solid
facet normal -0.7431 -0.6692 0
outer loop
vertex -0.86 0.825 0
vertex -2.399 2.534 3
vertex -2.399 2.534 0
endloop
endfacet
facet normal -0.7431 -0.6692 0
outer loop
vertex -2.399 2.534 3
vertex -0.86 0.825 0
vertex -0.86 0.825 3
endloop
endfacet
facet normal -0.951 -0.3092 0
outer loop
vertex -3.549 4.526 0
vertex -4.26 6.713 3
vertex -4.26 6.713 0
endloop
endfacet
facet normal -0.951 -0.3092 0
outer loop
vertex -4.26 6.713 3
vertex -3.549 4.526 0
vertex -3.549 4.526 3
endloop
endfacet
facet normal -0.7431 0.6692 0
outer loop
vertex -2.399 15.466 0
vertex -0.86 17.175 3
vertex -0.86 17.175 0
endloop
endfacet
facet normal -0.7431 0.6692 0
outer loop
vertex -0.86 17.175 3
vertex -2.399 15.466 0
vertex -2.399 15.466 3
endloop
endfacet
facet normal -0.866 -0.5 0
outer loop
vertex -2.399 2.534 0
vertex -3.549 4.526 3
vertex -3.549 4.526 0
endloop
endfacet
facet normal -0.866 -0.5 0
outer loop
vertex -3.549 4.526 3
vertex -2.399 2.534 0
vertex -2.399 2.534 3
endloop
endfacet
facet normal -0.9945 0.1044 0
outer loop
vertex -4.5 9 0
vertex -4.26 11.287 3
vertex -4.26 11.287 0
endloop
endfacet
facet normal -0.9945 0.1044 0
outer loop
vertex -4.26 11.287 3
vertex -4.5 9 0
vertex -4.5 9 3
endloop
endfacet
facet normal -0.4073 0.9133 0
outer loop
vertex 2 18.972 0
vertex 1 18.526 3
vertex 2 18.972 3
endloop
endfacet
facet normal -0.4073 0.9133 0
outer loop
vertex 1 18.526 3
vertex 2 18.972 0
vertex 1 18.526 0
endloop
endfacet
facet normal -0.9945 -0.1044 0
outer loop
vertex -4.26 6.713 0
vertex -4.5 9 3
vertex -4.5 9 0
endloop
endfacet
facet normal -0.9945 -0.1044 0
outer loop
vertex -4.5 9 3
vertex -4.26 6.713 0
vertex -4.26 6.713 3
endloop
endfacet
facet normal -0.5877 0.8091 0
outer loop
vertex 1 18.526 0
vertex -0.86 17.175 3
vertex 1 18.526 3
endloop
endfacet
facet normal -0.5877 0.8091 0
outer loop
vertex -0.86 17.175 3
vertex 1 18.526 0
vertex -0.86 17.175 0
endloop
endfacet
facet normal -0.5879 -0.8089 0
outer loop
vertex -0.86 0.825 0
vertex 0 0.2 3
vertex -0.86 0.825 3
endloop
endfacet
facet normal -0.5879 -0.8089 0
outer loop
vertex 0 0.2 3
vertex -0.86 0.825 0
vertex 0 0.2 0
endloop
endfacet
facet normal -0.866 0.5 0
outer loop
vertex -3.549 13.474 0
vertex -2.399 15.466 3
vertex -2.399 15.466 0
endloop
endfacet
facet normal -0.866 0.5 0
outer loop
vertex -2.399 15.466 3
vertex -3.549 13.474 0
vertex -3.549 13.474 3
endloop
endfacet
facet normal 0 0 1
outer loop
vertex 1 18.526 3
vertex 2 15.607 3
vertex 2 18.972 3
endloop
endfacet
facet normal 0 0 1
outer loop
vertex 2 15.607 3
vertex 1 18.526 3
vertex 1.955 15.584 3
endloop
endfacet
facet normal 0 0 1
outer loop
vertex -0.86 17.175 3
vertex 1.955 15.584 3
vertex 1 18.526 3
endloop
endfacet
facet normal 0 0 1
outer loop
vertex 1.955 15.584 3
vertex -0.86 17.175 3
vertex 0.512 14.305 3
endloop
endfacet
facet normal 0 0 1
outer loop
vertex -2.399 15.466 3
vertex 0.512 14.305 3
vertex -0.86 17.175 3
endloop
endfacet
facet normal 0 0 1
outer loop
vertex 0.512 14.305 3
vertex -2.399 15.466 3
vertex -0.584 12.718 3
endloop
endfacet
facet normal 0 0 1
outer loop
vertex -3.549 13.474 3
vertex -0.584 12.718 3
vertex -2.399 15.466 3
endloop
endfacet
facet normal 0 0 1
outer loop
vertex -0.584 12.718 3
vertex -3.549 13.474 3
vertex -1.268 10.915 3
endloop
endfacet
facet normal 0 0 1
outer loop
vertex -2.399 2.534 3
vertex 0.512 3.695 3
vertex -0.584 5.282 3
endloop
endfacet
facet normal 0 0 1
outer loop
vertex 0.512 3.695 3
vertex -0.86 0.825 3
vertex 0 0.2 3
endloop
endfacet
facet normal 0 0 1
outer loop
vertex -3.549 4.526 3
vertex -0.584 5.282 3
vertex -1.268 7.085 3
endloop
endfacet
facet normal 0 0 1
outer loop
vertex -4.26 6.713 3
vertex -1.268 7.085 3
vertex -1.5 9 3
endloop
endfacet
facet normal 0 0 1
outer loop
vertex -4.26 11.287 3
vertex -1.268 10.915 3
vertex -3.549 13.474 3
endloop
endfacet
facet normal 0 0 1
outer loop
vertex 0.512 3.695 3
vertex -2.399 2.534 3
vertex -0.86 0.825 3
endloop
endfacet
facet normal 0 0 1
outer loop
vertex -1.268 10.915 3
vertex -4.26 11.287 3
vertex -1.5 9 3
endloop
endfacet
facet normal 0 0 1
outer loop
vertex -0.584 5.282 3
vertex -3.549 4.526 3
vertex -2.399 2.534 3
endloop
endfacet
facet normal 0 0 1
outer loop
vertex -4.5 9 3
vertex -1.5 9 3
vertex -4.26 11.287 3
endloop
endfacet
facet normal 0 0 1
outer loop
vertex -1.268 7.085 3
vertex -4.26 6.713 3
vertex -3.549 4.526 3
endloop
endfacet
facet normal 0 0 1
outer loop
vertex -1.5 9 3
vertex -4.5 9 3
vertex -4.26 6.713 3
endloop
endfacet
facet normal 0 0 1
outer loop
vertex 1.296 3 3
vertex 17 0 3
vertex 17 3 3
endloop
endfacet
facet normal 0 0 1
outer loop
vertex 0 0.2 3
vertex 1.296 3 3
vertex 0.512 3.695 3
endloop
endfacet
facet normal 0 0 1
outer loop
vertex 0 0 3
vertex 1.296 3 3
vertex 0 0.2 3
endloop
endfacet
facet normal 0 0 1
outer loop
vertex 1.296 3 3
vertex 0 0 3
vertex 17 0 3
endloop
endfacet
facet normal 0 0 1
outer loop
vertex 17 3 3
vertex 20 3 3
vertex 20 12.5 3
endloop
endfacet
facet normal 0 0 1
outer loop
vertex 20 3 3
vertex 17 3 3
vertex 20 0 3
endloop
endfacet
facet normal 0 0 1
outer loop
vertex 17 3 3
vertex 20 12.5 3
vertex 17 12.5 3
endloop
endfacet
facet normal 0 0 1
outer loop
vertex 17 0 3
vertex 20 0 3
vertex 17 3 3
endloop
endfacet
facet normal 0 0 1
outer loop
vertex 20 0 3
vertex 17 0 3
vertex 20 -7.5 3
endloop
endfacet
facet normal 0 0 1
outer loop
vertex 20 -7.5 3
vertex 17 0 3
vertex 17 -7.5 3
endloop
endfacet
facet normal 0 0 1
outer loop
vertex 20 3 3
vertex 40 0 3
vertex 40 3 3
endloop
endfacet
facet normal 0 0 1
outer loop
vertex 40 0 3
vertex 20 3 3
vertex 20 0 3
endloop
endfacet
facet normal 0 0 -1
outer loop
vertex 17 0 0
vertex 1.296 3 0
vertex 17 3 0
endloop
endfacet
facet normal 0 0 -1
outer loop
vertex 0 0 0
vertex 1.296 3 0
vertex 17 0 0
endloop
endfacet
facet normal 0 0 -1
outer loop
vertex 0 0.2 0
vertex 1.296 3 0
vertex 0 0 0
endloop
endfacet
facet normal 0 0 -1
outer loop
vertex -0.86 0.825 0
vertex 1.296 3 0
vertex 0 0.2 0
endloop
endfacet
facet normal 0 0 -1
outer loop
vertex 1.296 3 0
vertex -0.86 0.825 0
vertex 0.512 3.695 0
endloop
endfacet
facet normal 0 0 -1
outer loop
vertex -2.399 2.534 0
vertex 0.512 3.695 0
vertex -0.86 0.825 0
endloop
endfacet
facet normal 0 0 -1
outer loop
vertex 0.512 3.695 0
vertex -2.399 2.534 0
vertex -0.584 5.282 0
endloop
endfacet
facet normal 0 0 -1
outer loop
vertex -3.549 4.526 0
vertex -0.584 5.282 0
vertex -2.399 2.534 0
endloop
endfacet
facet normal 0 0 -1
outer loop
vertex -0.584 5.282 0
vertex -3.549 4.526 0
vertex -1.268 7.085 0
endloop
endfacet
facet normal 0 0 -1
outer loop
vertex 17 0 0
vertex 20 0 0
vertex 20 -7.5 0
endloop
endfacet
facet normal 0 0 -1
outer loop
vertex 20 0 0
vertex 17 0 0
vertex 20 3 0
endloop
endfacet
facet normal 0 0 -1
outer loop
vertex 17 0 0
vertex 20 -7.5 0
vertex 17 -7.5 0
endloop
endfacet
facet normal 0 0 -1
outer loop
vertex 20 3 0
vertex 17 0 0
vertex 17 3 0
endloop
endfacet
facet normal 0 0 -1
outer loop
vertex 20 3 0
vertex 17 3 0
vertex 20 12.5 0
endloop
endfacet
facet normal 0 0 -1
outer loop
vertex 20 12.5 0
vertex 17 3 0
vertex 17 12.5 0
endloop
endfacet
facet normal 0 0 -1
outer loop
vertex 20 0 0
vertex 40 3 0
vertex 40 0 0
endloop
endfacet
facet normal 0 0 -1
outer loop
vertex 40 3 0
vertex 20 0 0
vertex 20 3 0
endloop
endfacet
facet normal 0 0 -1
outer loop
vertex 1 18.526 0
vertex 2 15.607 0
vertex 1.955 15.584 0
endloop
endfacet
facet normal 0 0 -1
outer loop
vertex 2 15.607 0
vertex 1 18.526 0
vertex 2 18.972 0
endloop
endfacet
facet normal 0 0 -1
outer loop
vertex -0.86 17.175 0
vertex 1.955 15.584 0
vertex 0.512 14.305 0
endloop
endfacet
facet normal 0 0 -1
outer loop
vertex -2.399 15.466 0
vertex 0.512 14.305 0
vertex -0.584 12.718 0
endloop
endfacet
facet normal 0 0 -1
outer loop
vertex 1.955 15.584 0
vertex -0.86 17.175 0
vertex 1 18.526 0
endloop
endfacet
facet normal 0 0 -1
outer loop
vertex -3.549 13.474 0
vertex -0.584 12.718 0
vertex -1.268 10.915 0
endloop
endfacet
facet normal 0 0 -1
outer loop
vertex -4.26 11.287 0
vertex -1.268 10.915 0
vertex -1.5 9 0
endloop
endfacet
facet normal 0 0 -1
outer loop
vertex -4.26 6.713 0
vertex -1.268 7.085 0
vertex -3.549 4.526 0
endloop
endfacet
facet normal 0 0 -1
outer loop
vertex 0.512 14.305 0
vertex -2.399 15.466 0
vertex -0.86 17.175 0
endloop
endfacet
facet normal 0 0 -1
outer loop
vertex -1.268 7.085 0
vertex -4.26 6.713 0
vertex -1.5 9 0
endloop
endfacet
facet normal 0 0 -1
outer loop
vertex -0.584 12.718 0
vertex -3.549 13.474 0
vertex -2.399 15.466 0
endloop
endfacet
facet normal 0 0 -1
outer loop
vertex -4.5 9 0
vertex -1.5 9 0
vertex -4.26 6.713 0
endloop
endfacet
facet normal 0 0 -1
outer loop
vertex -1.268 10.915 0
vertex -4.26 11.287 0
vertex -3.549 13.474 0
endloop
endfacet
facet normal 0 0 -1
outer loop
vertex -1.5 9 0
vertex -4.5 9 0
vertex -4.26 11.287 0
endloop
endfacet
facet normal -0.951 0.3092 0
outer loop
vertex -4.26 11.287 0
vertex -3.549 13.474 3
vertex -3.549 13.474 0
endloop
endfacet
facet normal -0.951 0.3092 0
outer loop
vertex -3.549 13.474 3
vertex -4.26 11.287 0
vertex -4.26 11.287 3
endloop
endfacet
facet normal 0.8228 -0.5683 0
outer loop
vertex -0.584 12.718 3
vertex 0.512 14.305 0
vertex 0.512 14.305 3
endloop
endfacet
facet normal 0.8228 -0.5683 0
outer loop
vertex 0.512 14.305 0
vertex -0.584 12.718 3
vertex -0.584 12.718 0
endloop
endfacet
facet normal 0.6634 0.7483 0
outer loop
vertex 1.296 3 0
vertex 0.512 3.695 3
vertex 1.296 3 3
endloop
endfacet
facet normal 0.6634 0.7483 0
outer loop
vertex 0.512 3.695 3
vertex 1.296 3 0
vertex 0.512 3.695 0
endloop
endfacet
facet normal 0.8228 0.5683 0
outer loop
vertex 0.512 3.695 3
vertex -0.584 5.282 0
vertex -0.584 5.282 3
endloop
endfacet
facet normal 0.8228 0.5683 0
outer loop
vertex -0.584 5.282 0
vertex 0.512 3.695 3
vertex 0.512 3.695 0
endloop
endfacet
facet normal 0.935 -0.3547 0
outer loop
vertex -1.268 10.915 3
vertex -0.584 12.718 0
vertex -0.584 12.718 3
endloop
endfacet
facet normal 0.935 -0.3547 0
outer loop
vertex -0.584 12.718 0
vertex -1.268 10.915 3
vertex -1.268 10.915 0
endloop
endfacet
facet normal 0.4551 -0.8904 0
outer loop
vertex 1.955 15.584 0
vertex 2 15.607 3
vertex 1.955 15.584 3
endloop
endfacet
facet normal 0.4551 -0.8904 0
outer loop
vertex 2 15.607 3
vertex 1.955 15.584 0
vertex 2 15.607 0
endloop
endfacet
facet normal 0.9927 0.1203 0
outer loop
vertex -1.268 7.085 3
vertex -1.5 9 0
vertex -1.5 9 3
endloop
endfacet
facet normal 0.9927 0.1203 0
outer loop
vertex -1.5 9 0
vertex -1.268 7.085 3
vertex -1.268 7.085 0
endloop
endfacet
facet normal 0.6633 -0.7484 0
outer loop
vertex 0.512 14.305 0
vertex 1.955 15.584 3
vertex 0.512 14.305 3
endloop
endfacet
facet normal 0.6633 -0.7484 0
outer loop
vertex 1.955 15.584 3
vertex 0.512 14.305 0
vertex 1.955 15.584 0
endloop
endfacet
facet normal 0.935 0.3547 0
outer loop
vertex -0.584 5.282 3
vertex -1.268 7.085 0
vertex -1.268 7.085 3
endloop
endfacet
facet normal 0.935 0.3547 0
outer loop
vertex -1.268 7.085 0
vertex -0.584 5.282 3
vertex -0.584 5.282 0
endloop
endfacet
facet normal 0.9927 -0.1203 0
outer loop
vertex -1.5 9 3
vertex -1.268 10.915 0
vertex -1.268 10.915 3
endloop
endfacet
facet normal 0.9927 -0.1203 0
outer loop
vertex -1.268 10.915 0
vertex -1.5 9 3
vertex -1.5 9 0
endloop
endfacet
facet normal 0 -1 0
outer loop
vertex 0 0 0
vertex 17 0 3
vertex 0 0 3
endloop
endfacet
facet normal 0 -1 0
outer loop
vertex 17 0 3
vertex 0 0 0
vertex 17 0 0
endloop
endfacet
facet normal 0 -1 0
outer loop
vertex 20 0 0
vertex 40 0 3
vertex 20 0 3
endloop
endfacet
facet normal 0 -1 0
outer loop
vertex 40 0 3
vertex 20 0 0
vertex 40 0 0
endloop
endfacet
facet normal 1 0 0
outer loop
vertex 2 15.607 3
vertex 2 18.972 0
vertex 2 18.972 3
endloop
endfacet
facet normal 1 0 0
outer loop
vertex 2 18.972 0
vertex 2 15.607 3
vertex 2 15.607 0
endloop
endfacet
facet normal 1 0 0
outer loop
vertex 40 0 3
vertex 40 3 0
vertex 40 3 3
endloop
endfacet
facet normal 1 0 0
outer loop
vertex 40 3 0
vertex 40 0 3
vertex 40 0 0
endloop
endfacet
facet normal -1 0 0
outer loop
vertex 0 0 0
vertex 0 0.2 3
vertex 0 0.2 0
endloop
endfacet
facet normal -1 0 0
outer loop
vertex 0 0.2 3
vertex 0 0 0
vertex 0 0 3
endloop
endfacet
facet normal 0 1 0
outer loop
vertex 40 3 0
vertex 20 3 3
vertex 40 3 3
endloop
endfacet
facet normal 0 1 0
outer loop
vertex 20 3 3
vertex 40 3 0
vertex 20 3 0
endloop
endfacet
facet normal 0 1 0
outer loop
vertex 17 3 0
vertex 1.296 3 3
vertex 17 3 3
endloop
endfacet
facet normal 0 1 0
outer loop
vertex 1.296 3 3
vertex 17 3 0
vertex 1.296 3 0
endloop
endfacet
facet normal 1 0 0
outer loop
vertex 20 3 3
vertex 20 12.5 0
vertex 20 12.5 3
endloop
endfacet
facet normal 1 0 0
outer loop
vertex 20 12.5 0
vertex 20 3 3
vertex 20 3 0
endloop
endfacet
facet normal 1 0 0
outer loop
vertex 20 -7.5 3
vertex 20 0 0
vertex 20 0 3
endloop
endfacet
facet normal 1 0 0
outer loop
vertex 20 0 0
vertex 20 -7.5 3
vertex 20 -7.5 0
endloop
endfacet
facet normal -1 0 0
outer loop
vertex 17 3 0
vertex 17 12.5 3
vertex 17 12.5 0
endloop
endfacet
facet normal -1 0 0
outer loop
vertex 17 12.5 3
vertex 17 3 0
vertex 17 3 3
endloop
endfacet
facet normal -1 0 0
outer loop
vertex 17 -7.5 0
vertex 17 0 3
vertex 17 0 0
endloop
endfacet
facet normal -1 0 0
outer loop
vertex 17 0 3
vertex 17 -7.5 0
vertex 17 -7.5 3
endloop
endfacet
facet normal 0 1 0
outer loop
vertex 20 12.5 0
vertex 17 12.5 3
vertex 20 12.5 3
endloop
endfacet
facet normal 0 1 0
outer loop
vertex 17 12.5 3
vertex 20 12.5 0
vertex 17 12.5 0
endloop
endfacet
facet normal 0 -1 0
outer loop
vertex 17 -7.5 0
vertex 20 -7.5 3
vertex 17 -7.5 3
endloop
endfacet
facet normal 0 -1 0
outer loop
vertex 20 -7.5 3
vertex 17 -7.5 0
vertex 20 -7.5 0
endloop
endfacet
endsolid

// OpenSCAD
//буква t
  cube([40,3,3]);
   difference(){
 translate([6.5,9,0]) cylinder(3,11,11);
 translate([6.5,9,-1]) cylinder(5,8,8);
 translate([0,-5,-1]) cube([20,5,5]);
 translate([2,0,-1]) cube([20,25,5]);
}
  translate([17,-7.5,0]) cube([3,20,3]);
